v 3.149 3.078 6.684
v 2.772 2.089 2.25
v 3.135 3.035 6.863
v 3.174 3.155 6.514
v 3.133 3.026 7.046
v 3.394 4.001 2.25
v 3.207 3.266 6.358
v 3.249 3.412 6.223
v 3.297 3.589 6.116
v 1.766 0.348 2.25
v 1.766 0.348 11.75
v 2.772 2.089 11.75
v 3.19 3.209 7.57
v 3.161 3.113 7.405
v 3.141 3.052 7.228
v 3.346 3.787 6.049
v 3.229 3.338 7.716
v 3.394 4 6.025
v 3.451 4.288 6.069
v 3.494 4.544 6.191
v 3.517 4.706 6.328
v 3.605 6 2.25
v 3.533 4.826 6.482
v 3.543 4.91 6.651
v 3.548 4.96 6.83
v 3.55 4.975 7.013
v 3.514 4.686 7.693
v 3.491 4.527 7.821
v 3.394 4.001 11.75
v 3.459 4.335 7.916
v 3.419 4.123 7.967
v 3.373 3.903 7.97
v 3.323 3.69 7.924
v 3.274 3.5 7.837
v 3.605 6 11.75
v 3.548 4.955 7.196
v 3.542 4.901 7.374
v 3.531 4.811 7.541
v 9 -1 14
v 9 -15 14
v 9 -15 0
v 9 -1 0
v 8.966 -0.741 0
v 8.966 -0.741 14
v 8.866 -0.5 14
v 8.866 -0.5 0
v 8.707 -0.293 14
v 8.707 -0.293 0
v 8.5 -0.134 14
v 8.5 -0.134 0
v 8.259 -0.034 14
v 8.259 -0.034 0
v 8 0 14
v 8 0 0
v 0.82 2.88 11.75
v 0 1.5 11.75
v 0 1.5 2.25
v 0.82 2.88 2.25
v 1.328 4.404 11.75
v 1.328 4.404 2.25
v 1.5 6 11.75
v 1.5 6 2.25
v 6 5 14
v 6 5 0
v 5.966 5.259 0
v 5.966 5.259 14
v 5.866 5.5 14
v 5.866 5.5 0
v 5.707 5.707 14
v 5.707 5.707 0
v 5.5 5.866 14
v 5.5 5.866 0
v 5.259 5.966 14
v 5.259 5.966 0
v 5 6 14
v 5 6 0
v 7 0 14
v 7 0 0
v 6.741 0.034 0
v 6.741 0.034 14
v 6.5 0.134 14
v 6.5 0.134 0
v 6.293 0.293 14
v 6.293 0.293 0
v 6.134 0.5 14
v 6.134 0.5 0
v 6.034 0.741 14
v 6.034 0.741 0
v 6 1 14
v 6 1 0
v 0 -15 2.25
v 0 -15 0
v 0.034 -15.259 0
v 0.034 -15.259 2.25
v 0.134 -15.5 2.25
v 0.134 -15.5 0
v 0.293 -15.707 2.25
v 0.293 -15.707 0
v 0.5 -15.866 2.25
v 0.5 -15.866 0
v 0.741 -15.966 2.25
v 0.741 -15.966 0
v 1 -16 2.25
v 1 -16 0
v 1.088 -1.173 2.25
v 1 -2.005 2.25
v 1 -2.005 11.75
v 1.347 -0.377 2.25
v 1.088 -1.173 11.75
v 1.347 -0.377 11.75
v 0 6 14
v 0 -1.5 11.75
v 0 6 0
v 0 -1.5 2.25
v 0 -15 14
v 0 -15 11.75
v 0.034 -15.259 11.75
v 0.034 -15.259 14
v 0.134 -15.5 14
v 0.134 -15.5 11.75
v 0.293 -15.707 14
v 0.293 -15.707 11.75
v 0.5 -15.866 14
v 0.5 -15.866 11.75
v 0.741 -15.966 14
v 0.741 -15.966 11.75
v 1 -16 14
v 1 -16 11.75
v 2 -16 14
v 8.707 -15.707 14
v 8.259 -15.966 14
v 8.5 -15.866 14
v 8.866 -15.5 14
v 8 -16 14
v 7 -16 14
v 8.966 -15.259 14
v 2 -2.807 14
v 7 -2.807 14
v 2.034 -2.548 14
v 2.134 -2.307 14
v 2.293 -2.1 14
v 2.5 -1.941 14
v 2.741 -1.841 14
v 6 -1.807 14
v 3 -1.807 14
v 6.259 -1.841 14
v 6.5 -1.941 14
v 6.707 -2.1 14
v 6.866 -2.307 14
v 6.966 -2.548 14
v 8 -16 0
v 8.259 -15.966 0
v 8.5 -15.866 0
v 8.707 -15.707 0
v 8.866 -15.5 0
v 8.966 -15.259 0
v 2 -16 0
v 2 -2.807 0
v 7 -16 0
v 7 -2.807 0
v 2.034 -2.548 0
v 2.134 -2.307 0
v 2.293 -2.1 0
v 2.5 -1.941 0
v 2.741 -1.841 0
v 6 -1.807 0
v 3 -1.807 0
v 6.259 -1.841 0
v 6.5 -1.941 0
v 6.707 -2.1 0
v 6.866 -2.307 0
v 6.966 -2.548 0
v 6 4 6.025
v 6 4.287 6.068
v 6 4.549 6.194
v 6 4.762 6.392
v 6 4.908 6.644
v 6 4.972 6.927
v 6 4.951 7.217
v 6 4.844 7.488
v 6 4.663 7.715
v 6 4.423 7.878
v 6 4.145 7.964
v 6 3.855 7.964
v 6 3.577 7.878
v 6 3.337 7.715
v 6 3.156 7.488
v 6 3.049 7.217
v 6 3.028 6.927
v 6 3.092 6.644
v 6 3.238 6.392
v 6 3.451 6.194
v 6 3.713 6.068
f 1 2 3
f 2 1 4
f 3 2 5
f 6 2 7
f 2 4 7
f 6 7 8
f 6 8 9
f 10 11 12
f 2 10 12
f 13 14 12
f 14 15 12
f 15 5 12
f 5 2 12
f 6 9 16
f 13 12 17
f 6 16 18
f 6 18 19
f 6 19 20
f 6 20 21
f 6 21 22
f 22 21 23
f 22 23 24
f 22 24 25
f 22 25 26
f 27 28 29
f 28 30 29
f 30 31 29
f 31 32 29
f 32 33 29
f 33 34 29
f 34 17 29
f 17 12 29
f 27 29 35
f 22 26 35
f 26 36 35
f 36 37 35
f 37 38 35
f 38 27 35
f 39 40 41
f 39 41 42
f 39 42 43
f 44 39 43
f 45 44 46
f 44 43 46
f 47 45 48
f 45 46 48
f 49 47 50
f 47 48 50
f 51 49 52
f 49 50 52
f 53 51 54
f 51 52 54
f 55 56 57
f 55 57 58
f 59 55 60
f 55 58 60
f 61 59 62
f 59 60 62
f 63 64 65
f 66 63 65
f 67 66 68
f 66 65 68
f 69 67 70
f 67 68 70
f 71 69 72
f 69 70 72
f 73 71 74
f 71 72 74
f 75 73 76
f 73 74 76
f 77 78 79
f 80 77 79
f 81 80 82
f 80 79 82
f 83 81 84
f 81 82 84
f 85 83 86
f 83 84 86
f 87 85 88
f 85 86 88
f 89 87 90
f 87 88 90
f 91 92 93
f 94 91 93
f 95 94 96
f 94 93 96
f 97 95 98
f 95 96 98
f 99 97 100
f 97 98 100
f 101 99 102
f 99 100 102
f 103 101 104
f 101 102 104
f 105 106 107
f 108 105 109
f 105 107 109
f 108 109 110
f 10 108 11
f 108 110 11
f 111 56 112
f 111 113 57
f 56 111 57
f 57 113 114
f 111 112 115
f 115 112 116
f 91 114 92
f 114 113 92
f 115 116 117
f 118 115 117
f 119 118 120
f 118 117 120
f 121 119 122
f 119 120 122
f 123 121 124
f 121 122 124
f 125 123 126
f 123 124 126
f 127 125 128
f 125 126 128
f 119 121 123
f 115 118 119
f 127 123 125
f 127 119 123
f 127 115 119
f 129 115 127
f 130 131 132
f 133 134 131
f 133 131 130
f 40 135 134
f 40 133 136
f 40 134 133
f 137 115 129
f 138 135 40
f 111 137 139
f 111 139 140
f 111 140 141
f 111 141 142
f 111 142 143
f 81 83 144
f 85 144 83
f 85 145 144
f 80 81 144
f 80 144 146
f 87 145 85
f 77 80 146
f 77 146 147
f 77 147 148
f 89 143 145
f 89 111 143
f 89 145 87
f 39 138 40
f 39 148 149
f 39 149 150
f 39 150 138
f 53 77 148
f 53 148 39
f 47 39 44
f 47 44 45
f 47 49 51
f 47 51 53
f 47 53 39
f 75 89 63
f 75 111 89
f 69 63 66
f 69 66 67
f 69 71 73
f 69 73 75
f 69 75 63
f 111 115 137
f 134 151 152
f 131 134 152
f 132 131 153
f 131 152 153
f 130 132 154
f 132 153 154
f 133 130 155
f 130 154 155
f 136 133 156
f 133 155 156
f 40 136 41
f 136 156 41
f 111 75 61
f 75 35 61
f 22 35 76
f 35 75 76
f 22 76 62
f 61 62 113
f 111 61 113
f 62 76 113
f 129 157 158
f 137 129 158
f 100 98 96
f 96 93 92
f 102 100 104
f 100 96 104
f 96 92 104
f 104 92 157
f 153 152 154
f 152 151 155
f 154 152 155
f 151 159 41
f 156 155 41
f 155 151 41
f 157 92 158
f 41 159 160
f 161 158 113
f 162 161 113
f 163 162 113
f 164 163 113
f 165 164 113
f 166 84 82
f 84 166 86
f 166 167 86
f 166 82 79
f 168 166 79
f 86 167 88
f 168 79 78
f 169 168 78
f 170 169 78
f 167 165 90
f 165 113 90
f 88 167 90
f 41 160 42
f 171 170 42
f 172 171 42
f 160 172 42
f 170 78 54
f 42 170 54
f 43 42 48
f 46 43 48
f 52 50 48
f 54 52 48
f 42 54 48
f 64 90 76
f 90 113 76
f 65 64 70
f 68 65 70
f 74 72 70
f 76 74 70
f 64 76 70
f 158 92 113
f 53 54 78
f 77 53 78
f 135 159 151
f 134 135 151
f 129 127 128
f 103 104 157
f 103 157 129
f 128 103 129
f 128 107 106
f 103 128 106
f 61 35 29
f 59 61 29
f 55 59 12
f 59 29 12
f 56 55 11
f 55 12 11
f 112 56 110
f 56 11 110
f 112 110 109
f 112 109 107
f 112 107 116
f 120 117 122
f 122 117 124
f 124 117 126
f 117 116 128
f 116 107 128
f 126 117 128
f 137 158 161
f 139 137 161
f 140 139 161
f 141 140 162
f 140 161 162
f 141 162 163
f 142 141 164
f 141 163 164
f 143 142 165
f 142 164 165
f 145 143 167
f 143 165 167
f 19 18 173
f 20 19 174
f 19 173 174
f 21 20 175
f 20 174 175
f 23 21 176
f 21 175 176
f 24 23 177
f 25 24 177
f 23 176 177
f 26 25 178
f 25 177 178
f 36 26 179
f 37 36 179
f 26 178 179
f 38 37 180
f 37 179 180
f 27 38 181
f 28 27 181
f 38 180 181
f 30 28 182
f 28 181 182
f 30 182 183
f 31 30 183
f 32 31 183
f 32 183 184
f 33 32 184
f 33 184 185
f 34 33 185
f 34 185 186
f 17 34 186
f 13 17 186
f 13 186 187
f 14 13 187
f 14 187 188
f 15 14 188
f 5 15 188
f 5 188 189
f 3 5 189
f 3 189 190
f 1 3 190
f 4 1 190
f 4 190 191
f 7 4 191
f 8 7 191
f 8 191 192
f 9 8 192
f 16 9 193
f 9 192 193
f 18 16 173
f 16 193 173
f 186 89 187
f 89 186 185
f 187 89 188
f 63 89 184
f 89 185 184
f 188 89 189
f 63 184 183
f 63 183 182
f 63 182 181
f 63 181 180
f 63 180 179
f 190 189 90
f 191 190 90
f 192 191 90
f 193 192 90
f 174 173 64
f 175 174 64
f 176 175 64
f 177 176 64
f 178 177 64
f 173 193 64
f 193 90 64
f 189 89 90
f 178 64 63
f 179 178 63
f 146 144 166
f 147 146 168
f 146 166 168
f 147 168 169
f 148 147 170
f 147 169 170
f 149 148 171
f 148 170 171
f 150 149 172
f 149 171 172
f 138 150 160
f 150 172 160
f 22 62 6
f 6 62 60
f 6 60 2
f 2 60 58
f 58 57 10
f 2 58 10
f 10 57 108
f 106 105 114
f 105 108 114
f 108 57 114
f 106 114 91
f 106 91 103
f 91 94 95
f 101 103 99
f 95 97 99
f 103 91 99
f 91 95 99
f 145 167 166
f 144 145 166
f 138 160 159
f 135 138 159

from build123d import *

# Parameters (mm, degrees)
BOSS_EXTRUDE3_DEPTH = 14
SKETCH5_W           = 9.5
SKETCH5_H           = 3
SKETCH9_R           = 0.975
CUT_EXTRUDE1_DEPTH  = 4.5
CUT_EXTRUDE3_DEPTH  = 1
FILLET2_R           = 4


with BuildPart() as part:
    # Sketch4 → Boss-Extrude3 (new body)
    with BuildSketch(Plane.XY):
        with BuildLine():
            Line((7, -16), (8, -16))
            ThreePointArc((8, -16), (8.707106781, -15.707106781), (9, -15))
            Line((9, -15), (9, -1))
            ThreePointArc((9, -1), (8.707106781, -0.292893219), (8, 0))
            Line((8, 0), (7, 0))
            ThreePointArc((7, 0), (6.292893219, 0.292893219), (6, 1))
            Line((6, 1), (6, 5))
            ThreePointArc((6, 5), (5.707106781, 5.707106781), (5, 6))
            Line((5, 6), (0, 6))
            Line((0, 6), (0, 0))
            Line((0, 0), (0, -15))
            ThreePointArc((0, -15), (0.292893219, -15.707106781), (1, -16))
            Line((1, -16), (2, -16))
            Line((2, -16), (2, -2.806818182))
            ThreePointArc((2, -2.806818182), (2.292893219, -2.099711401), (3, -1.806818182))
            Line((3, -1.806818182), (6, -1.806818182))
            ThreePointArc((6, -1.806818182), (6.707106781, -2.099711401), (7, -2.806818182))
            Line((7, -2.806818182), (7, -16))
        make_face()
    extrude(amount=BOSS_EXTRUDE3_DEPTH)

    # Cut-Sweep2: sweep along a path in Sketch8
    with BuildLine(Plane.XY.offset(14)) as cut_sweep2_path:
        CenterArc((-6, 6), 11, 0, 360)
    # Sketch5 → Cut-Sweep2 (sweep, cut)
    with BuildSketch(Plane.ZY):
        with Locations((7, 0)):
            Rectangle(SKETCH5_W, SKETCH5_H)
    sweep(path=cut_sweep2_path.line, mode=Mode.SUBTRACT)

    # Sketch9 → Cut-Extrude1 (cut)
    with BuildSketch(Plane(origin=(6, 0, 0), x_dir=(0, 0, -1), z_dir=(1, 0, 0))):
        with Locations((-7, 4)):
            Circle(SKETCH9_R)
    extrude(amount=-CUT_EXTRUDE1_DEPTH, mode=Mode.SUBTRACT)

    # Sketch11 → Cut-Extrude3 (cut)
    with BuildSketch(Plane.ZY):
        Polygon((2.25, -1.5), (2.25, 0), (11.75, 0), (11.75, -1.5), (11.75, -16), (2.25, -16), align=None)
    extrude(amount=-CUT_EXTRUDE3_DEPTH, mode=Mode.SUBTRACT)

    # Fillet2
    fillet2_edges = [part.edges().sort_by_distance(p)[0] for p in [
        (1, -0.576473219, 7),
    ]]
    fillet(fillet2_edges, radius=FILLET2_R)


solid = part.part
